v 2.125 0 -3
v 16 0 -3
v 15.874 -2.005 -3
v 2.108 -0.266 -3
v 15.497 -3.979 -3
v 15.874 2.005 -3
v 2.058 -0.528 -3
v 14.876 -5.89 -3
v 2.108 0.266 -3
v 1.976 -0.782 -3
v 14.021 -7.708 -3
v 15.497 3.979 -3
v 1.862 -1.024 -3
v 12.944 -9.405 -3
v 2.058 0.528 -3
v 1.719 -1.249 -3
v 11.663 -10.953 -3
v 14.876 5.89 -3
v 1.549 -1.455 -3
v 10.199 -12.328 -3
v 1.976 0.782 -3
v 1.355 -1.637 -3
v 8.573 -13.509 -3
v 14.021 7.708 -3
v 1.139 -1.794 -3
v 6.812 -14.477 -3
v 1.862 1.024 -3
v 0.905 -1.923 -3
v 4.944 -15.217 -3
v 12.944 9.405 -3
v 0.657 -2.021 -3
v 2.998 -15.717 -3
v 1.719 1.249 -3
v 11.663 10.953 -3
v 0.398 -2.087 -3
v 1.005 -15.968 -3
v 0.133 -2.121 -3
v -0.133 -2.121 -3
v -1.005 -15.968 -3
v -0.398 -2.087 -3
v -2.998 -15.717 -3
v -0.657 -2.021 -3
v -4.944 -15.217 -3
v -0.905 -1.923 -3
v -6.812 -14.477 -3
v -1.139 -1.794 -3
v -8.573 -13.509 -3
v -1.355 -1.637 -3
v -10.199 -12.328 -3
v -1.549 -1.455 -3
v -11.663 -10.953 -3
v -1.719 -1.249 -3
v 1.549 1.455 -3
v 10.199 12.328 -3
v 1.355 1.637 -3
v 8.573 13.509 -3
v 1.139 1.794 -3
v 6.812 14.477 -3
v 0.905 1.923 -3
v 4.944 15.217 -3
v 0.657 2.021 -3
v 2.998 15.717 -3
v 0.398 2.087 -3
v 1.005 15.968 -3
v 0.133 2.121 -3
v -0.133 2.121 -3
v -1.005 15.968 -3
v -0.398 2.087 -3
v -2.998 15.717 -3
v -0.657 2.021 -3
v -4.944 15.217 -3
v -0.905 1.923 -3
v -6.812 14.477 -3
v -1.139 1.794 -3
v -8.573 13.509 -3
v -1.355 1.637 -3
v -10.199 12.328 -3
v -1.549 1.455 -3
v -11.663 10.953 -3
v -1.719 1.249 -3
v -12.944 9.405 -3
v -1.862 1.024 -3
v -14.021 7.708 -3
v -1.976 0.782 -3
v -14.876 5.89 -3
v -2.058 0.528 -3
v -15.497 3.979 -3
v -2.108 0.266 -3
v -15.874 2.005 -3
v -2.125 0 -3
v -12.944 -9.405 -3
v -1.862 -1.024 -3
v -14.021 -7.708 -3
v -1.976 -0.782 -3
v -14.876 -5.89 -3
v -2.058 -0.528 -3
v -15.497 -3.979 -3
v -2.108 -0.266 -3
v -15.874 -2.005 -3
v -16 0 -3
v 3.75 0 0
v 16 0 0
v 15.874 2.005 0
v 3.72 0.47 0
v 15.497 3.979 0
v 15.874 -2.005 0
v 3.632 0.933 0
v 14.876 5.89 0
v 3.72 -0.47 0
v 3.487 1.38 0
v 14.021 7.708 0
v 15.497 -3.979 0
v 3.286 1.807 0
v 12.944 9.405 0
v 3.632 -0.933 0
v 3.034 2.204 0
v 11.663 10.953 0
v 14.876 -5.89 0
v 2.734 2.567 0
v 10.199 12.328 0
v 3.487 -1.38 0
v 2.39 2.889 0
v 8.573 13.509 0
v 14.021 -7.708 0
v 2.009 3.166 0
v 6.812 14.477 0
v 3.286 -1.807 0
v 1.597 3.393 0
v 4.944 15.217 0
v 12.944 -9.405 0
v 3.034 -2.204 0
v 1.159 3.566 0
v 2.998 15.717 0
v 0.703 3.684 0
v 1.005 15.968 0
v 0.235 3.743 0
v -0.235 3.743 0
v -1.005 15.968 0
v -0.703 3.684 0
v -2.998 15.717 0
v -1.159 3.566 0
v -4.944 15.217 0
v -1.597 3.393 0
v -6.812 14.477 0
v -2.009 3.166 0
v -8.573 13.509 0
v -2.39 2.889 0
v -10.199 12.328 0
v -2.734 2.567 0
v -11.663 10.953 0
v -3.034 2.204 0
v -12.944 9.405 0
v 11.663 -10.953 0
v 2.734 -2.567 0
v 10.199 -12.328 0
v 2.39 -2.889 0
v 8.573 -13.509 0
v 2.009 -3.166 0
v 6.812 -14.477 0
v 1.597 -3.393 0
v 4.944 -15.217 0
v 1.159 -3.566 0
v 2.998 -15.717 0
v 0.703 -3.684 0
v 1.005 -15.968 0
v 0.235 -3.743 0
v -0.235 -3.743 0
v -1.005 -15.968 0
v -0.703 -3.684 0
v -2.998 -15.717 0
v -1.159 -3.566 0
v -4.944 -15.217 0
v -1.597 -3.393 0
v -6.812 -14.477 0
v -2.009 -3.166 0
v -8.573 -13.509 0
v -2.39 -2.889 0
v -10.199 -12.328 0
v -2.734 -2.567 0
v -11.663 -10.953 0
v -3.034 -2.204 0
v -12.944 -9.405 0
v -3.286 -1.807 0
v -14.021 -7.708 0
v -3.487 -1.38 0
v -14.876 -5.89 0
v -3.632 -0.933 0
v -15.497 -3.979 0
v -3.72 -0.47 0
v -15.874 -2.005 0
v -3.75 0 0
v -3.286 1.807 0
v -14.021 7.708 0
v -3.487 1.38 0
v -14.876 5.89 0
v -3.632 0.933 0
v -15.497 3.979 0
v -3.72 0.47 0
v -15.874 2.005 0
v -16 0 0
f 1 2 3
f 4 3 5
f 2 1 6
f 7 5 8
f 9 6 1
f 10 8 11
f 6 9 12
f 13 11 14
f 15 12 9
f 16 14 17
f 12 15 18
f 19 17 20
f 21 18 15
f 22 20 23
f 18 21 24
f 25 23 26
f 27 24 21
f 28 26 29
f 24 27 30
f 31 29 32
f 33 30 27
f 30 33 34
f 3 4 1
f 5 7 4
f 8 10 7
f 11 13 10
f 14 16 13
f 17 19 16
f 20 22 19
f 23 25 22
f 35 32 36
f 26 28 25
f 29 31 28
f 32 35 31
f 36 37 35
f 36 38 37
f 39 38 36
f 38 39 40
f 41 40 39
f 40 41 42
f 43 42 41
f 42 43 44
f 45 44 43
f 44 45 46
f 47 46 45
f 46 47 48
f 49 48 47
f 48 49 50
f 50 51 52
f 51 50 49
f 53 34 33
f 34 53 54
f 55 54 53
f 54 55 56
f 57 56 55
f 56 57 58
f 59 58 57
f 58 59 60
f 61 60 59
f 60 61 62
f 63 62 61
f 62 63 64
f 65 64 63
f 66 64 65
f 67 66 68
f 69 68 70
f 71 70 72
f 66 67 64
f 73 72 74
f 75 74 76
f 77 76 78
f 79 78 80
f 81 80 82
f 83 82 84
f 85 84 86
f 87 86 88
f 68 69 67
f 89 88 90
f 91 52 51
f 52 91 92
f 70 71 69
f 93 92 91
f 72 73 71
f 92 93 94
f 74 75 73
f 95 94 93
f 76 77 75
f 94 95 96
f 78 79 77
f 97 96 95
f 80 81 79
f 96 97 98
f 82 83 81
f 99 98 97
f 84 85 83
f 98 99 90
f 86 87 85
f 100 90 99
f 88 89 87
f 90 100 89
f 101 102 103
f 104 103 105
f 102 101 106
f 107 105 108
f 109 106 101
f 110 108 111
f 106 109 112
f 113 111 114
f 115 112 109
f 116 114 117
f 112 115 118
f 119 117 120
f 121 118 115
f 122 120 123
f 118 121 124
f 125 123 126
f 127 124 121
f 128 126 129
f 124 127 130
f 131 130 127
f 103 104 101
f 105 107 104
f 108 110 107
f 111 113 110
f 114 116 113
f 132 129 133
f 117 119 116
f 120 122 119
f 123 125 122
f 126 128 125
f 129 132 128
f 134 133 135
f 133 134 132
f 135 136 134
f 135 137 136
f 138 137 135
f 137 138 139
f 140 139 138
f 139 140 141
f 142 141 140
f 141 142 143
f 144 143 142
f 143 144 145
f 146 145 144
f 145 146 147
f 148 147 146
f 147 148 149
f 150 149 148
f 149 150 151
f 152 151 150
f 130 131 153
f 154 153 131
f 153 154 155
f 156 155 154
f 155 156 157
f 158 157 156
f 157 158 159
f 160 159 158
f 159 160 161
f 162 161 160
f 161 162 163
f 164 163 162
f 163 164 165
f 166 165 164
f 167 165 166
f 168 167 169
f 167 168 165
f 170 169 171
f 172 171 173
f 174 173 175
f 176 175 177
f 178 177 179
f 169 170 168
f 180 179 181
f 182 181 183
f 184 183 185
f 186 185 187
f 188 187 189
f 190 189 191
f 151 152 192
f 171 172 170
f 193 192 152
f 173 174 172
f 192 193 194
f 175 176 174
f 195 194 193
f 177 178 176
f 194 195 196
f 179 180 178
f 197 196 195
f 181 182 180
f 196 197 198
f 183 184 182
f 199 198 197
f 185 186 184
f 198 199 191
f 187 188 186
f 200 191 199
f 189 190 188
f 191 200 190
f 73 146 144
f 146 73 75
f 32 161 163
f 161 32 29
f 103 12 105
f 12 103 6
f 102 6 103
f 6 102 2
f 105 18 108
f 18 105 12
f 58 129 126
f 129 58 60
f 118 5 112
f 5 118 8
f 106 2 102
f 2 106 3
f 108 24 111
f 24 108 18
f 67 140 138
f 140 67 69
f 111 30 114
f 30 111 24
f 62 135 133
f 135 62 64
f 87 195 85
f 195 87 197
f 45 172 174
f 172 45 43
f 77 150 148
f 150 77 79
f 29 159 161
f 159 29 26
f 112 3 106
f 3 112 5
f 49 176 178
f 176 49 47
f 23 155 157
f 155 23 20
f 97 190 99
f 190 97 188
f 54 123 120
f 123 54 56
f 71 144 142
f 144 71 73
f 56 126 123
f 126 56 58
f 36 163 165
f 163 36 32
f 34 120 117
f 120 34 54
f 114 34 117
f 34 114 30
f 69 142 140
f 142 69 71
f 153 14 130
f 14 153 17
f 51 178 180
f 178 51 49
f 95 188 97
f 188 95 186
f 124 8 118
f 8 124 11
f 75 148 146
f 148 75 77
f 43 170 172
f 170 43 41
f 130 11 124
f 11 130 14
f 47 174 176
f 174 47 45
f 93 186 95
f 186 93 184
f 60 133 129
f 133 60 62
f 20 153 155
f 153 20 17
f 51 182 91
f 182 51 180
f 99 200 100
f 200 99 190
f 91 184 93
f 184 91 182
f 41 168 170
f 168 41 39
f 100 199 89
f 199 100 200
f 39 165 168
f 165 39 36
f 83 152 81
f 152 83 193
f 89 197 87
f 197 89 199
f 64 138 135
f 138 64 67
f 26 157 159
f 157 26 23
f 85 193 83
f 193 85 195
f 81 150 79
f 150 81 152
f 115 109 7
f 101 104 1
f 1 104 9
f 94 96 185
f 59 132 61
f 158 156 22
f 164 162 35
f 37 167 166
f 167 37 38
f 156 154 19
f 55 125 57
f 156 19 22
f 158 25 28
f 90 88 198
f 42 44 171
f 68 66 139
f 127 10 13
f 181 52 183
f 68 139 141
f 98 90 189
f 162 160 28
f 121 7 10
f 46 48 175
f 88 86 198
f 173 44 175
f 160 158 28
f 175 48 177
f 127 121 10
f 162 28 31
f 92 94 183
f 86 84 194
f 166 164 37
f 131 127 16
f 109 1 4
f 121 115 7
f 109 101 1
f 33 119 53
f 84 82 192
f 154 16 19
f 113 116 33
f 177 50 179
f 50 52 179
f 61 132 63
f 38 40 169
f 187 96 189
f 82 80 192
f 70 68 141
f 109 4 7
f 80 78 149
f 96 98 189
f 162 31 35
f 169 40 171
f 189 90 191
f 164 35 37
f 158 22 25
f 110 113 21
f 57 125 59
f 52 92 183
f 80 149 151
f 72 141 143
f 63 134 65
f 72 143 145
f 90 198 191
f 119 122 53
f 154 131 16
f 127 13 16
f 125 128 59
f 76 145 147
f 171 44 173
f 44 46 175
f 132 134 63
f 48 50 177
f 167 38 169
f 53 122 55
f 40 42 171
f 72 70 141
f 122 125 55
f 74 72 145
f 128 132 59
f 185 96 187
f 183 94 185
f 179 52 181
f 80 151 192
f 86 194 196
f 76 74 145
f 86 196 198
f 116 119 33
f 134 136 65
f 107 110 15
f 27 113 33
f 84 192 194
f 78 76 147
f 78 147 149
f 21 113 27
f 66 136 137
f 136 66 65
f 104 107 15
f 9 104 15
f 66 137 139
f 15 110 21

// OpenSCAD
$fn = 50;


difference() {
	union() {
		translate(v = [0, 0, -3.0000000000]) {
			cylinder(h = 3, r = 7.0000000000);
		}
		translate(v = [0, 0, -3.0000000000]) {
			cylinder(h = 3, r = 16.0000000000);
		}
	}
	union() {
		translate(v = [0, 0, 0]) {
			rotate(a = [0, 0, 0]) {
				difference() {
					union() {
						#translate(v = [0, 0, -3.0000000000]) {
							cylinder(h = 3, r = 2.0000000000);
						}
						#translate(v = [0, 0, -3]) {
							cylinder(h = 3, r = 7.0000000000, r1 = 2.1250000000, r2 = 3.7500000000);
						}
						#translate(v = [0, 0, -3.0000000000]) {
							cylinder(h = 3, r = 2.1250000000);
						}
						#translate(v = [0, 0, -3.0000000000]) {
							cylinder(h = 3, r = 2.0000000000);
						}
					}
					union();
				}
			}
		}
	}
}
